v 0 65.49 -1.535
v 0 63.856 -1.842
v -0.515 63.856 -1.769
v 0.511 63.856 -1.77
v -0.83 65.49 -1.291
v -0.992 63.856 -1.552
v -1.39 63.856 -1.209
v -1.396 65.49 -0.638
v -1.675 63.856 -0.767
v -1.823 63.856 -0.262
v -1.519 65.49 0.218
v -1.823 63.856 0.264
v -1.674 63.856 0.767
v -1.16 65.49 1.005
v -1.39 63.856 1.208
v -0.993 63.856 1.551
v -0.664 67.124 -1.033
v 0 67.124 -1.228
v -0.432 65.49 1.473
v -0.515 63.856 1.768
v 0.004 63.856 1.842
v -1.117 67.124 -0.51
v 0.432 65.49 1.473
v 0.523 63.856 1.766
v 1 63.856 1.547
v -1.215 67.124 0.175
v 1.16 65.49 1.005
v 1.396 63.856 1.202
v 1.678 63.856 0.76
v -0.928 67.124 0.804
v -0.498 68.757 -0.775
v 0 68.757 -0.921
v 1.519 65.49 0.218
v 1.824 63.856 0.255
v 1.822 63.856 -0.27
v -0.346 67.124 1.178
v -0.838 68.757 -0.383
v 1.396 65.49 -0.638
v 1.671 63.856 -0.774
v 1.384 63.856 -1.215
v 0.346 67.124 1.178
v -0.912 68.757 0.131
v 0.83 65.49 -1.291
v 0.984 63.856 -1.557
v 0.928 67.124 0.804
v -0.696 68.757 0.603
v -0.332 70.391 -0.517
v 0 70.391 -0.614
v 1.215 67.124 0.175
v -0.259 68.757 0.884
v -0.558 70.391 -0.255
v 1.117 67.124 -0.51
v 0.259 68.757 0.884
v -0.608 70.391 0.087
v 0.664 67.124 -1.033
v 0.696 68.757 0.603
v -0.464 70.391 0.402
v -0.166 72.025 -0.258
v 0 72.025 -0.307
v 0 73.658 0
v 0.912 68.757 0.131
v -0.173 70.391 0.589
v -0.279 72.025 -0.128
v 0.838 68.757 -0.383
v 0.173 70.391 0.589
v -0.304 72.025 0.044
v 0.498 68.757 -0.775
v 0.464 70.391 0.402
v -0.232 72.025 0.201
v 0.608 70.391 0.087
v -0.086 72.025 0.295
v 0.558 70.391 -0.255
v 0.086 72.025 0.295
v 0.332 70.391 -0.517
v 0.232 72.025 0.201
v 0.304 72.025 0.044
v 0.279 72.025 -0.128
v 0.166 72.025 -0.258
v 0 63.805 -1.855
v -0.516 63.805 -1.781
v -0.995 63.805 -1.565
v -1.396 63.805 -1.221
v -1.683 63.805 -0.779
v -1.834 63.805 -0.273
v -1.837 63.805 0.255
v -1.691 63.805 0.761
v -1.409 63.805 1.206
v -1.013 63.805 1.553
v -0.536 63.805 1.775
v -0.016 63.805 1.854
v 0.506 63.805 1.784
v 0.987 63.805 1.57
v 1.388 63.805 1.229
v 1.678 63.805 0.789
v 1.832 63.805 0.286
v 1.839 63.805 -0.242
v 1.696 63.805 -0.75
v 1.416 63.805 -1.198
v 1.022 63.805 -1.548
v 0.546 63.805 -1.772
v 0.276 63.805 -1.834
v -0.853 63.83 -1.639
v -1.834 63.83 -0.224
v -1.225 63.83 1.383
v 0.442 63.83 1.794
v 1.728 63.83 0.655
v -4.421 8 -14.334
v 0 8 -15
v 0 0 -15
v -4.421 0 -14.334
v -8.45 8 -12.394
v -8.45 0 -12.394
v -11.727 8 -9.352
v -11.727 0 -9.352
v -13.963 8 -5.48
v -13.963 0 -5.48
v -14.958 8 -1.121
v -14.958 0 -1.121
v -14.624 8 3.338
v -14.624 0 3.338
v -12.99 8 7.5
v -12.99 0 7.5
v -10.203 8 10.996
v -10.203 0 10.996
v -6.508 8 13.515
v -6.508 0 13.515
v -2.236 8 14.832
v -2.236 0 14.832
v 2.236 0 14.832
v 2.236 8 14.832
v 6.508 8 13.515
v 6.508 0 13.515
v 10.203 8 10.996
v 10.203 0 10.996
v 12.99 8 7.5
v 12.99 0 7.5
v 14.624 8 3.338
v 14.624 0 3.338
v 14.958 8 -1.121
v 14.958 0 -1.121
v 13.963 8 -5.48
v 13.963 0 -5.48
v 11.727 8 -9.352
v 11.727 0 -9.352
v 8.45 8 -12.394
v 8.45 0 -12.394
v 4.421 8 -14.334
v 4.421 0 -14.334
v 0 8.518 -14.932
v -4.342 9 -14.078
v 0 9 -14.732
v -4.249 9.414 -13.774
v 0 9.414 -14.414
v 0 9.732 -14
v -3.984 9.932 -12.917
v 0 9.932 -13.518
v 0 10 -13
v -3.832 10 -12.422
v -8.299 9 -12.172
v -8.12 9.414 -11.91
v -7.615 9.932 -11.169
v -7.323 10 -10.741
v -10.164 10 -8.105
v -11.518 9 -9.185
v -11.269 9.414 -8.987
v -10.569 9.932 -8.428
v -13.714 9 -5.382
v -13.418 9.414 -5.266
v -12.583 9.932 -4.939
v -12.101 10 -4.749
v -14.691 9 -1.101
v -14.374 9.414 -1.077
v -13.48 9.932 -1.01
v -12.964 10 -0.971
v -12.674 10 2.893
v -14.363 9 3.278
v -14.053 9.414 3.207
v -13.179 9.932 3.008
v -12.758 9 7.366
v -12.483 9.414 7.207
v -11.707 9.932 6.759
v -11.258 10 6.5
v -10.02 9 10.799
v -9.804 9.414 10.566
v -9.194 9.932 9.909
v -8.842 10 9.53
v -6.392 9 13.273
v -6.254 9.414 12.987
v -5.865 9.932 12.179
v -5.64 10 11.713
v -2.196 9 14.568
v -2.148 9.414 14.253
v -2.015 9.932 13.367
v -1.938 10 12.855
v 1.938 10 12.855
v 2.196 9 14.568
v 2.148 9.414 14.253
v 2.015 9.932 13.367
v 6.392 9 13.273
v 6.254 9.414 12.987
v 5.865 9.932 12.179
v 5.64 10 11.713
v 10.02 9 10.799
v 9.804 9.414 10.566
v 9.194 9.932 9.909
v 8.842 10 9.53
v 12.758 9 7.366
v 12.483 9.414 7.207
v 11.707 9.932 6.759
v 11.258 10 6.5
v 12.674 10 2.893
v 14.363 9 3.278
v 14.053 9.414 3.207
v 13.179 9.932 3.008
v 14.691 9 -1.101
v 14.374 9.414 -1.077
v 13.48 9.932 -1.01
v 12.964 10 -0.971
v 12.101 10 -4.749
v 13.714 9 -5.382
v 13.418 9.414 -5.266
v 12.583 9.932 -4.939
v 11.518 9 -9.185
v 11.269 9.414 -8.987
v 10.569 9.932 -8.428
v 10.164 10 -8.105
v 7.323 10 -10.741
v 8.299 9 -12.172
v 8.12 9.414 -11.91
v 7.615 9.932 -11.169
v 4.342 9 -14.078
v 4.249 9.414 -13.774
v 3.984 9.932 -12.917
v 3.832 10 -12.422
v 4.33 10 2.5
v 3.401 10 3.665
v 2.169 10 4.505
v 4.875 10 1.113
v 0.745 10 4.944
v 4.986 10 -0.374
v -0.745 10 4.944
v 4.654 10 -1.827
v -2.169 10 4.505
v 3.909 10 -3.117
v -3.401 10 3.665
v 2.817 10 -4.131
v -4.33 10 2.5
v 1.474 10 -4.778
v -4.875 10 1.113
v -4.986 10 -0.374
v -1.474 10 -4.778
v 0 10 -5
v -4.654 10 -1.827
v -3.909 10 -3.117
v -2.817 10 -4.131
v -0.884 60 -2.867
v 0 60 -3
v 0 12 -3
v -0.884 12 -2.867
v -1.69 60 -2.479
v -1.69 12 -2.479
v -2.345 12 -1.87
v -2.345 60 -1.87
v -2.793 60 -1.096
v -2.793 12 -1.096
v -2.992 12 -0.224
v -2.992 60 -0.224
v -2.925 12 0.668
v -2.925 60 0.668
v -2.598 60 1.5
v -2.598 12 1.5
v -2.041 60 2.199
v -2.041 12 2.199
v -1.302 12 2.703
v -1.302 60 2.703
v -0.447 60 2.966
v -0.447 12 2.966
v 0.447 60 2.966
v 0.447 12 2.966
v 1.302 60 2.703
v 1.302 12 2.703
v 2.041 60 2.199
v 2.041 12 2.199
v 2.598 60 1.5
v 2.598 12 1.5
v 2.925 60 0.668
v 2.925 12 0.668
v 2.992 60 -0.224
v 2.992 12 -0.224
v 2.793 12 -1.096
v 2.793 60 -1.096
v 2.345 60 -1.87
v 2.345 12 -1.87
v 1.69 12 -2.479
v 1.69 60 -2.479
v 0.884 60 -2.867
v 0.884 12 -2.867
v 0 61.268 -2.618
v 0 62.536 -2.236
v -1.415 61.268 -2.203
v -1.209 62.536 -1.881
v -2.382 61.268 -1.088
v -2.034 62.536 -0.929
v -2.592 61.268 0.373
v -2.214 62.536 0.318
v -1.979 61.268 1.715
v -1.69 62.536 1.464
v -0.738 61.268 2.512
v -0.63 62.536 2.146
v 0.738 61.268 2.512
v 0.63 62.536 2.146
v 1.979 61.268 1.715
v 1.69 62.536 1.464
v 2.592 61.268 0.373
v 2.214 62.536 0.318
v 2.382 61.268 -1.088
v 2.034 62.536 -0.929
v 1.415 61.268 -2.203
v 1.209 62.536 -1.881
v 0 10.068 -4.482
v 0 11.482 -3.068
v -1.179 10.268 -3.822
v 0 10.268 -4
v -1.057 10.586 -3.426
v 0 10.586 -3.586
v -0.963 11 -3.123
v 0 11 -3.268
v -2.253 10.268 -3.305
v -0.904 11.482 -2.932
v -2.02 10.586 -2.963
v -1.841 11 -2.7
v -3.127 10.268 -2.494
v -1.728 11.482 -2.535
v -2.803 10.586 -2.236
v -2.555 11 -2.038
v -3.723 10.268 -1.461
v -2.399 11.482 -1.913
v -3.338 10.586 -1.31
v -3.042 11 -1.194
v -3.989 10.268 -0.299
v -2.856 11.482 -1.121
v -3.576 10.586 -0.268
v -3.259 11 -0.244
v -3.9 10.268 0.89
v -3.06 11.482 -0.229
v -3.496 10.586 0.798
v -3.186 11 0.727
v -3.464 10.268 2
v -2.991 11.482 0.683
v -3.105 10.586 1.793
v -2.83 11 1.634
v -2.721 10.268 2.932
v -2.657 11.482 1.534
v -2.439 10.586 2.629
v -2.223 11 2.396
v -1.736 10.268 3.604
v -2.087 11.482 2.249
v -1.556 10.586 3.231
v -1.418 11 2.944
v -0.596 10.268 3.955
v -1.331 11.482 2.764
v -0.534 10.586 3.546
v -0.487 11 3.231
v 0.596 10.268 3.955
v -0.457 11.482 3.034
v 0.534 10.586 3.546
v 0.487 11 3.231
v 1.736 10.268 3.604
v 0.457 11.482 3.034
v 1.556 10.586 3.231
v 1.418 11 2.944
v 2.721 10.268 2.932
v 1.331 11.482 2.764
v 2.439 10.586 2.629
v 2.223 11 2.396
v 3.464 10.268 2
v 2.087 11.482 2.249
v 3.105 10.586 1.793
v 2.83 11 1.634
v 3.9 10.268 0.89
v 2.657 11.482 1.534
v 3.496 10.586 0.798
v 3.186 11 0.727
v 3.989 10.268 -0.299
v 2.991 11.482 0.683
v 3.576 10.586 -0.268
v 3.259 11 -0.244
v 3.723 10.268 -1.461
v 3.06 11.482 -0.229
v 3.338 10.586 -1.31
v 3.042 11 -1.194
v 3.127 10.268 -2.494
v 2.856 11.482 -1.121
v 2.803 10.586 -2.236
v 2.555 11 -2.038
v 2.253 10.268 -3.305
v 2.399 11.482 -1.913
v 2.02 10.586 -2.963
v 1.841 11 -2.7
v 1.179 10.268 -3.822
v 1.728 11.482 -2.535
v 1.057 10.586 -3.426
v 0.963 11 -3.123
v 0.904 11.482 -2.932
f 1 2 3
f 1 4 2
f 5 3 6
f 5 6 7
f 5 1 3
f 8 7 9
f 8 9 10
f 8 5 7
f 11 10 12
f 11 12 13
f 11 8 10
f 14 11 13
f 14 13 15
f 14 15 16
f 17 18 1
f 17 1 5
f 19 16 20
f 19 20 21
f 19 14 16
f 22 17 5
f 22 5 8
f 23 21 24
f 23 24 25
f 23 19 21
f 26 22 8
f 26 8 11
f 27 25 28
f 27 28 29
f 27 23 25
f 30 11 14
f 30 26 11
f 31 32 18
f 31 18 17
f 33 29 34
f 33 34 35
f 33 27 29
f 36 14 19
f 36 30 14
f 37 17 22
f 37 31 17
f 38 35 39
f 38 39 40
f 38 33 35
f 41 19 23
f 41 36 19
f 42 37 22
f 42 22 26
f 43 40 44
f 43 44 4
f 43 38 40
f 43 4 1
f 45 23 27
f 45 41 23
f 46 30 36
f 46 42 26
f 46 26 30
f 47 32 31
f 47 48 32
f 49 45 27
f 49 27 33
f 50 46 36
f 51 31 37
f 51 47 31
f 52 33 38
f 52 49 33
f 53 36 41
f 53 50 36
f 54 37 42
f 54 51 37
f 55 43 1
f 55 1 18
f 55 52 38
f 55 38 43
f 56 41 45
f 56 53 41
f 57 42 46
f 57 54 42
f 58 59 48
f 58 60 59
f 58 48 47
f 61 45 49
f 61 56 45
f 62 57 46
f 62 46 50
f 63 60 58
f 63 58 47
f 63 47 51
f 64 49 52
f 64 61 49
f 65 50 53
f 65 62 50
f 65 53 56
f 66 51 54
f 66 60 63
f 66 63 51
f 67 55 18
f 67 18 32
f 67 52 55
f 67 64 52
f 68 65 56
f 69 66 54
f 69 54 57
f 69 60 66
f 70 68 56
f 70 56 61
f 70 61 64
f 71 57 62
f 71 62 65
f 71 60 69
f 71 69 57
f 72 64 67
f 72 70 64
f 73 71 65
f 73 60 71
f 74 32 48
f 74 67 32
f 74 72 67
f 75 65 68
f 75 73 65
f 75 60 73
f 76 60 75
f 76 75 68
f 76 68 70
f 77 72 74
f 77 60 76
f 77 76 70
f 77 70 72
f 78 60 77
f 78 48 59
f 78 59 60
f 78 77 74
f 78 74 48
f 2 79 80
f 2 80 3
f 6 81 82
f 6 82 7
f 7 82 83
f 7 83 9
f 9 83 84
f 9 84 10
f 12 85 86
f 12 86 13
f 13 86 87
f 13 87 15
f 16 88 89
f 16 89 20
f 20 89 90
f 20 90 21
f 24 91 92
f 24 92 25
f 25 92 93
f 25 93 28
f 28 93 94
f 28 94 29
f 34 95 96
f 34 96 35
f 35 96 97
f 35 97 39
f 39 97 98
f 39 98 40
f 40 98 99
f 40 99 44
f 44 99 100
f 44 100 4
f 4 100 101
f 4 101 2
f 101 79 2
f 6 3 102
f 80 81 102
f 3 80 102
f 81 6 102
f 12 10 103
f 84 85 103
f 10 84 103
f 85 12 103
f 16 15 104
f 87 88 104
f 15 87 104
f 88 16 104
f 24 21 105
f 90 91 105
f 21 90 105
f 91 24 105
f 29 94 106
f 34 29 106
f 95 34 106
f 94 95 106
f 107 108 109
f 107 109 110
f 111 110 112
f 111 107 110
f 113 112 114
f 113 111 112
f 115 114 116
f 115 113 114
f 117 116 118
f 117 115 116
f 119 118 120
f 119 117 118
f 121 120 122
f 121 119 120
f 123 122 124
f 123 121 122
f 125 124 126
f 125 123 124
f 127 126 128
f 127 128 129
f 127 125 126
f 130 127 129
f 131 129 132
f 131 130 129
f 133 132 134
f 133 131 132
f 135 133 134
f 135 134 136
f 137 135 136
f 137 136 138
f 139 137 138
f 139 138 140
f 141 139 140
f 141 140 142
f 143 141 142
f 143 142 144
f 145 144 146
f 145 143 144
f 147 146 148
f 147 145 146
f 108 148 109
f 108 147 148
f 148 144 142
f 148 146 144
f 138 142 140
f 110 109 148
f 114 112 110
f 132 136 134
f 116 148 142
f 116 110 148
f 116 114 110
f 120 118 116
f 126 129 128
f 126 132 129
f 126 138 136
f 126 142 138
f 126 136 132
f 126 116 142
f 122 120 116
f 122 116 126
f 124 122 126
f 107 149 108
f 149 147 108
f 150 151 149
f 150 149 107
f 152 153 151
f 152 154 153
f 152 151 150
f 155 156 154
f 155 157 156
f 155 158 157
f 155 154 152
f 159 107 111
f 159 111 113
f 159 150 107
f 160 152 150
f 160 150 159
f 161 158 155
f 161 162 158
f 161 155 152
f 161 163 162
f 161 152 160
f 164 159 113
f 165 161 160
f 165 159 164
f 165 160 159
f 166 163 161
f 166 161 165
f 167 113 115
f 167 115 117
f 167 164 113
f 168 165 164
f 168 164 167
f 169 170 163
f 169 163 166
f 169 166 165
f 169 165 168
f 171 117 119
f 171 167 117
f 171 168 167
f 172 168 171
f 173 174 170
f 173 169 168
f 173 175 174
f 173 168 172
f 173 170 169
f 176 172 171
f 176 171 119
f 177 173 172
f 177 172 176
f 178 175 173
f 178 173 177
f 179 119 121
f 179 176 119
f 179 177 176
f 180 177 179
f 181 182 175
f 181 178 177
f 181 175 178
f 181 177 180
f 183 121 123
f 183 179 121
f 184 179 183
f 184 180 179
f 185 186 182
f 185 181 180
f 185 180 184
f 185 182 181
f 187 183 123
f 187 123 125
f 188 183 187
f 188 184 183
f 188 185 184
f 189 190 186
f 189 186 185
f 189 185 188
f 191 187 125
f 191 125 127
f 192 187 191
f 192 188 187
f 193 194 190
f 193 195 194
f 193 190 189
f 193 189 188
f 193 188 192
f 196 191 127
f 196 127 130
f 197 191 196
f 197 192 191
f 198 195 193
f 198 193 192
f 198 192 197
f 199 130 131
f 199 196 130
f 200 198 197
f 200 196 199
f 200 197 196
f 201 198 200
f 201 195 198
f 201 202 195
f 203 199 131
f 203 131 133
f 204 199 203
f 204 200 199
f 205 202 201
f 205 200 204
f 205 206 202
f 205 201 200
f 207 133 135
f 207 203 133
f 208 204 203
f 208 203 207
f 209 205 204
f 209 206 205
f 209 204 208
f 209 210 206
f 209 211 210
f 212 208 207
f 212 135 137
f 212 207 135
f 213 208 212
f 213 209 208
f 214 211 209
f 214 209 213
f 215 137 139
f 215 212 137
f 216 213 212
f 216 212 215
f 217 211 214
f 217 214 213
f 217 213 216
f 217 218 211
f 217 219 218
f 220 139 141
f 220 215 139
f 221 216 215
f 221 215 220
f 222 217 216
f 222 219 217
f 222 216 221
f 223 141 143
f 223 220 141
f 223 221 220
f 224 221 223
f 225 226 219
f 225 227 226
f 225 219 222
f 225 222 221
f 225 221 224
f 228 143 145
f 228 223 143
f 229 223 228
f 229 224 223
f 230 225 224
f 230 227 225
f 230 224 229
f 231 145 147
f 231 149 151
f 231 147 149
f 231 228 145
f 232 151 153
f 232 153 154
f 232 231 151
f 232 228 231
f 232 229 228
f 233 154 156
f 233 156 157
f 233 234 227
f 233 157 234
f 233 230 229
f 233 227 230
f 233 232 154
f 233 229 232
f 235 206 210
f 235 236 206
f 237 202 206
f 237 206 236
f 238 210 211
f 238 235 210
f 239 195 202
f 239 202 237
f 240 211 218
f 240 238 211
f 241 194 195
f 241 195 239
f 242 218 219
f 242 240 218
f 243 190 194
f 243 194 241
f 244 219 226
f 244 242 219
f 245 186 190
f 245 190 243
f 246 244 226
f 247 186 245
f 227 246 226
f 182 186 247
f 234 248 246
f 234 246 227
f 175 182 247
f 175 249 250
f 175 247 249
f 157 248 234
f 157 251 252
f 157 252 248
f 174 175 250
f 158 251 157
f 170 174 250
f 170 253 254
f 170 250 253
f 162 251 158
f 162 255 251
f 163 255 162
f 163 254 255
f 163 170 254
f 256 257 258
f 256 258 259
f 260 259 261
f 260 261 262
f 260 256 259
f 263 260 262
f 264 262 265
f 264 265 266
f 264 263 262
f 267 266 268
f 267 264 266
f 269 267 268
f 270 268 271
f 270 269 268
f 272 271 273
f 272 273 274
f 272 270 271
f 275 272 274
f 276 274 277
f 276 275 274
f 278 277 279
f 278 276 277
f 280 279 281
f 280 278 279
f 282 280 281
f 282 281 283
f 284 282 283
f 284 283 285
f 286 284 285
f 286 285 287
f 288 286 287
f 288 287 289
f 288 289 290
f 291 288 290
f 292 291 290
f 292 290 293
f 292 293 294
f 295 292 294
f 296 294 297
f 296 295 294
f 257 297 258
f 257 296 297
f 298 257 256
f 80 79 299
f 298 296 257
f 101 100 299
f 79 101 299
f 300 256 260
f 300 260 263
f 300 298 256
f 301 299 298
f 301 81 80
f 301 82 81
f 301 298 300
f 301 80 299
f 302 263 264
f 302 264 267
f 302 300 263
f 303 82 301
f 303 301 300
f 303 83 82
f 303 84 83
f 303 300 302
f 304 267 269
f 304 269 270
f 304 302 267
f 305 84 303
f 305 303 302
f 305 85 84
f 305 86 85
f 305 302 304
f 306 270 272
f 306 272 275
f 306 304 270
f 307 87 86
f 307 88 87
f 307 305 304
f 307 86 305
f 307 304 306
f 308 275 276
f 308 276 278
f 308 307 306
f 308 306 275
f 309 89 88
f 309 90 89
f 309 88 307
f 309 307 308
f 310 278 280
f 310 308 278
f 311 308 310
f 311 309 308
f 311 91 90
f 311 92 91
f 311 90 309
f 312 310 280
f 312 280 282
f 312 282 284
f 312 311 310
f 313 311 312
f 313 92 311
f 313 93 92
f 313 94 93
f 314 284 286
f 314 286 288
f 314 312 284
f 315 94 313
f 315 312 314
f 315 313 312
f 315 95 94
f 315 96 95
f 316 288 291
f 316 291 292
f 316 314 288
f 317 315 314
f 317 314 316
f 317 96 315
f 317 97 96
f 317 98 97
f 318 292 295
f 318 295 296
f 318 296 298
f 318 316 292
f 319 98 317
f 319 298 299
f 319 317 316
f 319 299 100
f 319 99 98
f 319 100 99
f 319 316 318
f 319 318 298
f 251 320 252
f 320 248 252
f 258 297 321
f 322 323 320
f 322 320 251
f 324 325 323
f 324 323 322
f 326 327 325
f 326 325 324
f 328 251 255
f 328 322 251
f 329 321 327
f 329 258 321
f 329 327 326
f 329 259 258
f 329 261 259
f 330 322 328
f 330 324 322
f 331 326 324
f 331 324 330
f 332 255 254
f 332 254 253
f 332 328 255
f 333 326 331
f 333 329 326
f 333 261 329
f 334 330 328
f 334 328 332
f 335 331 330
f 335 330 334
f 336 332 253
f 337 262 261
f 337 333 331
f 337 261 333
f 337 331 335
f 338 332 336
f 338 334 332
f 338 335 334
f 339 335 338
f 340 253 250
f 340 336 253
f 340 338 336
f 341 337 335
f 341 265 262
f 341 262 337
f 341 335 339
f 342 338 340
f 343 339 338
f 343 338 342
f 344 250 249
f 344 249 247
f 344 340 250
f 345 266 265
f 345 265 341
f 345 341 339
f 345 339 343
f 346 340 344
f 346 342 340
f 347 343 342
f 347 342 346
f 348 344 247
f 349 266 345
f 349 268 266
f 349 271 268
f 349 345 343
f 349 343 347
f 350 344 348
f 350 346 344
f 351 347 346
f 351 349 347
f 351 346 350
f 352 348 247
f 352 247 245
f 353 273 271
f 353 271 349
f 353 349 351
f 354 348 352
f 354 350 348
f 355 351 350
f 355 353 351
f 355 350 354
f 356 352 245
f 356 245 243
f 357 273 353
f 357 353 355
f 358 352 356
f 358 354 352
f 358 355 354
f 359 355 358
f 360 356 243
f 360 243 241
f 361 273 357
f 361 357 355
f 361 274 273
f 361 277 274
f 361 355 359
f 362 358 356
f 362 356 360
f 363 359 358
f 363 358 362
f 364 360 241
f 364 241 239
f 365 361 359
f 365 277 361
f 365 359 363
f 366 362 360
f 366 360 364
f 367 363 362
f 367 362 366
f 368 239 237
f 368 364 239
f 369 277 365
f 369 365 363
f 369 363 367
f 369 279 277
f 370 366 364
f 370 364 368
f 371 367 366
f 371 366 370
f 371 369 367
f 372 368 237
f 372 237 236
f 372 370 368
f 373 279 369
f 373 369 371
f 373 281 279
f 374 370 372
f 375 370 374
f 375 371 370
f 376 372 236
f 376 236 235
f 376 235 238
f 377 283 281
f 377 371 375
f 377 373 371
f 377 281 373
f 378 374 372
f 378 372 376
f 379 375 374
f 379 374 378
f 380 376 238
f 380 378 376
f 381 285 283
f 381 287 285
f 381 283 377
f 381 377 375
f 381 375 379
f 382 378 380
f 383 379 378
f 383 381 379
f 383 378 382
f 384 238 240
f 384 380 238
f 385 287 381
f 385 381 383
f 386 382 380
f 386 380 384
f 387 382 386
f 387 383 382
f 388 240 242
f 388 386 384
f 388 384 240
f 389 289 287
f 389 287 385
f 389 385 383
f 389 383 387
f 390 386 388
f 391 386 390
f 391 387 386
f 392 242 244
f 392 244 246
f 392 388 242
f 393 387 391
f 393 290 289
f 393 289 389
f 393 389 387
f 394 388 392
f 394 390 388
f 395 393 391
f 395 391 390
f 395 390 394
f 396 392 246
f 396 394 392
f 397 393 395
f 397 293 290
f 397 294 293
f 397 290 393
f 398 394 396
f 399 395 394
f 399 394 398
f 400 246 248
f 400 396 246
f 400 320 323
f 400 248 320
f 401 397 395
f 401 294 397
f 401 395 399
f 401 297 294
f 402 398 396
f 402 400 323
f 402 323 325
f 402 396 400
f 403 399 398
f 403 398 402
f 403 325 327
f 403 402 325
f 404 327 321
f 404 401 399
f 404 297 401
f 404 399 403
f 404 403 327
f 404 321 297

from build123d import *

# Parameters (mm, degrees)
CONG_1_R = 2
CONG_2_R = 2
CONG_3_R = 0.5


with BuildPart() as part:
    # Esquisse1 → Révolution1 (revolve)
    with BuildSketch(Plane(origin=(0, 0, 0), x_dir=(0, 0, -1), z_dir=(1, 0, 0))):
        Polygon((0, 0), (15, 0), (15, 10), (3, 10), (3, 60), (1.846825454, 63.830168203), (0, 73.658150486), align=None)
    revolve(axis=Axis((0, 0, 0), (0, 1, 0)))

    # Congé1
    cong_1_edges = [part.edges().sort_by_distance(p)[0] for p in [
        (0, 10, 15),
    ]]
    fillet(cong_1_edges, radius=CONG_1_R)

    # Congé2
    cong_2_edges = [part.edges().sort_by_distance(p)[0] for p in [
        (0, 10, 3),
    ]]
    fillet(cong_2_edges, radius=CONG_2_R)

    # Congé3
    cong_3_edges = [part.edges().sort_by_distance(p)[0] for p in [
        (0, 63.830168203, 1.846825454),
    ]]
    fillet(cong_3_edges, radius=CONG_3_R)


solid = part.part
